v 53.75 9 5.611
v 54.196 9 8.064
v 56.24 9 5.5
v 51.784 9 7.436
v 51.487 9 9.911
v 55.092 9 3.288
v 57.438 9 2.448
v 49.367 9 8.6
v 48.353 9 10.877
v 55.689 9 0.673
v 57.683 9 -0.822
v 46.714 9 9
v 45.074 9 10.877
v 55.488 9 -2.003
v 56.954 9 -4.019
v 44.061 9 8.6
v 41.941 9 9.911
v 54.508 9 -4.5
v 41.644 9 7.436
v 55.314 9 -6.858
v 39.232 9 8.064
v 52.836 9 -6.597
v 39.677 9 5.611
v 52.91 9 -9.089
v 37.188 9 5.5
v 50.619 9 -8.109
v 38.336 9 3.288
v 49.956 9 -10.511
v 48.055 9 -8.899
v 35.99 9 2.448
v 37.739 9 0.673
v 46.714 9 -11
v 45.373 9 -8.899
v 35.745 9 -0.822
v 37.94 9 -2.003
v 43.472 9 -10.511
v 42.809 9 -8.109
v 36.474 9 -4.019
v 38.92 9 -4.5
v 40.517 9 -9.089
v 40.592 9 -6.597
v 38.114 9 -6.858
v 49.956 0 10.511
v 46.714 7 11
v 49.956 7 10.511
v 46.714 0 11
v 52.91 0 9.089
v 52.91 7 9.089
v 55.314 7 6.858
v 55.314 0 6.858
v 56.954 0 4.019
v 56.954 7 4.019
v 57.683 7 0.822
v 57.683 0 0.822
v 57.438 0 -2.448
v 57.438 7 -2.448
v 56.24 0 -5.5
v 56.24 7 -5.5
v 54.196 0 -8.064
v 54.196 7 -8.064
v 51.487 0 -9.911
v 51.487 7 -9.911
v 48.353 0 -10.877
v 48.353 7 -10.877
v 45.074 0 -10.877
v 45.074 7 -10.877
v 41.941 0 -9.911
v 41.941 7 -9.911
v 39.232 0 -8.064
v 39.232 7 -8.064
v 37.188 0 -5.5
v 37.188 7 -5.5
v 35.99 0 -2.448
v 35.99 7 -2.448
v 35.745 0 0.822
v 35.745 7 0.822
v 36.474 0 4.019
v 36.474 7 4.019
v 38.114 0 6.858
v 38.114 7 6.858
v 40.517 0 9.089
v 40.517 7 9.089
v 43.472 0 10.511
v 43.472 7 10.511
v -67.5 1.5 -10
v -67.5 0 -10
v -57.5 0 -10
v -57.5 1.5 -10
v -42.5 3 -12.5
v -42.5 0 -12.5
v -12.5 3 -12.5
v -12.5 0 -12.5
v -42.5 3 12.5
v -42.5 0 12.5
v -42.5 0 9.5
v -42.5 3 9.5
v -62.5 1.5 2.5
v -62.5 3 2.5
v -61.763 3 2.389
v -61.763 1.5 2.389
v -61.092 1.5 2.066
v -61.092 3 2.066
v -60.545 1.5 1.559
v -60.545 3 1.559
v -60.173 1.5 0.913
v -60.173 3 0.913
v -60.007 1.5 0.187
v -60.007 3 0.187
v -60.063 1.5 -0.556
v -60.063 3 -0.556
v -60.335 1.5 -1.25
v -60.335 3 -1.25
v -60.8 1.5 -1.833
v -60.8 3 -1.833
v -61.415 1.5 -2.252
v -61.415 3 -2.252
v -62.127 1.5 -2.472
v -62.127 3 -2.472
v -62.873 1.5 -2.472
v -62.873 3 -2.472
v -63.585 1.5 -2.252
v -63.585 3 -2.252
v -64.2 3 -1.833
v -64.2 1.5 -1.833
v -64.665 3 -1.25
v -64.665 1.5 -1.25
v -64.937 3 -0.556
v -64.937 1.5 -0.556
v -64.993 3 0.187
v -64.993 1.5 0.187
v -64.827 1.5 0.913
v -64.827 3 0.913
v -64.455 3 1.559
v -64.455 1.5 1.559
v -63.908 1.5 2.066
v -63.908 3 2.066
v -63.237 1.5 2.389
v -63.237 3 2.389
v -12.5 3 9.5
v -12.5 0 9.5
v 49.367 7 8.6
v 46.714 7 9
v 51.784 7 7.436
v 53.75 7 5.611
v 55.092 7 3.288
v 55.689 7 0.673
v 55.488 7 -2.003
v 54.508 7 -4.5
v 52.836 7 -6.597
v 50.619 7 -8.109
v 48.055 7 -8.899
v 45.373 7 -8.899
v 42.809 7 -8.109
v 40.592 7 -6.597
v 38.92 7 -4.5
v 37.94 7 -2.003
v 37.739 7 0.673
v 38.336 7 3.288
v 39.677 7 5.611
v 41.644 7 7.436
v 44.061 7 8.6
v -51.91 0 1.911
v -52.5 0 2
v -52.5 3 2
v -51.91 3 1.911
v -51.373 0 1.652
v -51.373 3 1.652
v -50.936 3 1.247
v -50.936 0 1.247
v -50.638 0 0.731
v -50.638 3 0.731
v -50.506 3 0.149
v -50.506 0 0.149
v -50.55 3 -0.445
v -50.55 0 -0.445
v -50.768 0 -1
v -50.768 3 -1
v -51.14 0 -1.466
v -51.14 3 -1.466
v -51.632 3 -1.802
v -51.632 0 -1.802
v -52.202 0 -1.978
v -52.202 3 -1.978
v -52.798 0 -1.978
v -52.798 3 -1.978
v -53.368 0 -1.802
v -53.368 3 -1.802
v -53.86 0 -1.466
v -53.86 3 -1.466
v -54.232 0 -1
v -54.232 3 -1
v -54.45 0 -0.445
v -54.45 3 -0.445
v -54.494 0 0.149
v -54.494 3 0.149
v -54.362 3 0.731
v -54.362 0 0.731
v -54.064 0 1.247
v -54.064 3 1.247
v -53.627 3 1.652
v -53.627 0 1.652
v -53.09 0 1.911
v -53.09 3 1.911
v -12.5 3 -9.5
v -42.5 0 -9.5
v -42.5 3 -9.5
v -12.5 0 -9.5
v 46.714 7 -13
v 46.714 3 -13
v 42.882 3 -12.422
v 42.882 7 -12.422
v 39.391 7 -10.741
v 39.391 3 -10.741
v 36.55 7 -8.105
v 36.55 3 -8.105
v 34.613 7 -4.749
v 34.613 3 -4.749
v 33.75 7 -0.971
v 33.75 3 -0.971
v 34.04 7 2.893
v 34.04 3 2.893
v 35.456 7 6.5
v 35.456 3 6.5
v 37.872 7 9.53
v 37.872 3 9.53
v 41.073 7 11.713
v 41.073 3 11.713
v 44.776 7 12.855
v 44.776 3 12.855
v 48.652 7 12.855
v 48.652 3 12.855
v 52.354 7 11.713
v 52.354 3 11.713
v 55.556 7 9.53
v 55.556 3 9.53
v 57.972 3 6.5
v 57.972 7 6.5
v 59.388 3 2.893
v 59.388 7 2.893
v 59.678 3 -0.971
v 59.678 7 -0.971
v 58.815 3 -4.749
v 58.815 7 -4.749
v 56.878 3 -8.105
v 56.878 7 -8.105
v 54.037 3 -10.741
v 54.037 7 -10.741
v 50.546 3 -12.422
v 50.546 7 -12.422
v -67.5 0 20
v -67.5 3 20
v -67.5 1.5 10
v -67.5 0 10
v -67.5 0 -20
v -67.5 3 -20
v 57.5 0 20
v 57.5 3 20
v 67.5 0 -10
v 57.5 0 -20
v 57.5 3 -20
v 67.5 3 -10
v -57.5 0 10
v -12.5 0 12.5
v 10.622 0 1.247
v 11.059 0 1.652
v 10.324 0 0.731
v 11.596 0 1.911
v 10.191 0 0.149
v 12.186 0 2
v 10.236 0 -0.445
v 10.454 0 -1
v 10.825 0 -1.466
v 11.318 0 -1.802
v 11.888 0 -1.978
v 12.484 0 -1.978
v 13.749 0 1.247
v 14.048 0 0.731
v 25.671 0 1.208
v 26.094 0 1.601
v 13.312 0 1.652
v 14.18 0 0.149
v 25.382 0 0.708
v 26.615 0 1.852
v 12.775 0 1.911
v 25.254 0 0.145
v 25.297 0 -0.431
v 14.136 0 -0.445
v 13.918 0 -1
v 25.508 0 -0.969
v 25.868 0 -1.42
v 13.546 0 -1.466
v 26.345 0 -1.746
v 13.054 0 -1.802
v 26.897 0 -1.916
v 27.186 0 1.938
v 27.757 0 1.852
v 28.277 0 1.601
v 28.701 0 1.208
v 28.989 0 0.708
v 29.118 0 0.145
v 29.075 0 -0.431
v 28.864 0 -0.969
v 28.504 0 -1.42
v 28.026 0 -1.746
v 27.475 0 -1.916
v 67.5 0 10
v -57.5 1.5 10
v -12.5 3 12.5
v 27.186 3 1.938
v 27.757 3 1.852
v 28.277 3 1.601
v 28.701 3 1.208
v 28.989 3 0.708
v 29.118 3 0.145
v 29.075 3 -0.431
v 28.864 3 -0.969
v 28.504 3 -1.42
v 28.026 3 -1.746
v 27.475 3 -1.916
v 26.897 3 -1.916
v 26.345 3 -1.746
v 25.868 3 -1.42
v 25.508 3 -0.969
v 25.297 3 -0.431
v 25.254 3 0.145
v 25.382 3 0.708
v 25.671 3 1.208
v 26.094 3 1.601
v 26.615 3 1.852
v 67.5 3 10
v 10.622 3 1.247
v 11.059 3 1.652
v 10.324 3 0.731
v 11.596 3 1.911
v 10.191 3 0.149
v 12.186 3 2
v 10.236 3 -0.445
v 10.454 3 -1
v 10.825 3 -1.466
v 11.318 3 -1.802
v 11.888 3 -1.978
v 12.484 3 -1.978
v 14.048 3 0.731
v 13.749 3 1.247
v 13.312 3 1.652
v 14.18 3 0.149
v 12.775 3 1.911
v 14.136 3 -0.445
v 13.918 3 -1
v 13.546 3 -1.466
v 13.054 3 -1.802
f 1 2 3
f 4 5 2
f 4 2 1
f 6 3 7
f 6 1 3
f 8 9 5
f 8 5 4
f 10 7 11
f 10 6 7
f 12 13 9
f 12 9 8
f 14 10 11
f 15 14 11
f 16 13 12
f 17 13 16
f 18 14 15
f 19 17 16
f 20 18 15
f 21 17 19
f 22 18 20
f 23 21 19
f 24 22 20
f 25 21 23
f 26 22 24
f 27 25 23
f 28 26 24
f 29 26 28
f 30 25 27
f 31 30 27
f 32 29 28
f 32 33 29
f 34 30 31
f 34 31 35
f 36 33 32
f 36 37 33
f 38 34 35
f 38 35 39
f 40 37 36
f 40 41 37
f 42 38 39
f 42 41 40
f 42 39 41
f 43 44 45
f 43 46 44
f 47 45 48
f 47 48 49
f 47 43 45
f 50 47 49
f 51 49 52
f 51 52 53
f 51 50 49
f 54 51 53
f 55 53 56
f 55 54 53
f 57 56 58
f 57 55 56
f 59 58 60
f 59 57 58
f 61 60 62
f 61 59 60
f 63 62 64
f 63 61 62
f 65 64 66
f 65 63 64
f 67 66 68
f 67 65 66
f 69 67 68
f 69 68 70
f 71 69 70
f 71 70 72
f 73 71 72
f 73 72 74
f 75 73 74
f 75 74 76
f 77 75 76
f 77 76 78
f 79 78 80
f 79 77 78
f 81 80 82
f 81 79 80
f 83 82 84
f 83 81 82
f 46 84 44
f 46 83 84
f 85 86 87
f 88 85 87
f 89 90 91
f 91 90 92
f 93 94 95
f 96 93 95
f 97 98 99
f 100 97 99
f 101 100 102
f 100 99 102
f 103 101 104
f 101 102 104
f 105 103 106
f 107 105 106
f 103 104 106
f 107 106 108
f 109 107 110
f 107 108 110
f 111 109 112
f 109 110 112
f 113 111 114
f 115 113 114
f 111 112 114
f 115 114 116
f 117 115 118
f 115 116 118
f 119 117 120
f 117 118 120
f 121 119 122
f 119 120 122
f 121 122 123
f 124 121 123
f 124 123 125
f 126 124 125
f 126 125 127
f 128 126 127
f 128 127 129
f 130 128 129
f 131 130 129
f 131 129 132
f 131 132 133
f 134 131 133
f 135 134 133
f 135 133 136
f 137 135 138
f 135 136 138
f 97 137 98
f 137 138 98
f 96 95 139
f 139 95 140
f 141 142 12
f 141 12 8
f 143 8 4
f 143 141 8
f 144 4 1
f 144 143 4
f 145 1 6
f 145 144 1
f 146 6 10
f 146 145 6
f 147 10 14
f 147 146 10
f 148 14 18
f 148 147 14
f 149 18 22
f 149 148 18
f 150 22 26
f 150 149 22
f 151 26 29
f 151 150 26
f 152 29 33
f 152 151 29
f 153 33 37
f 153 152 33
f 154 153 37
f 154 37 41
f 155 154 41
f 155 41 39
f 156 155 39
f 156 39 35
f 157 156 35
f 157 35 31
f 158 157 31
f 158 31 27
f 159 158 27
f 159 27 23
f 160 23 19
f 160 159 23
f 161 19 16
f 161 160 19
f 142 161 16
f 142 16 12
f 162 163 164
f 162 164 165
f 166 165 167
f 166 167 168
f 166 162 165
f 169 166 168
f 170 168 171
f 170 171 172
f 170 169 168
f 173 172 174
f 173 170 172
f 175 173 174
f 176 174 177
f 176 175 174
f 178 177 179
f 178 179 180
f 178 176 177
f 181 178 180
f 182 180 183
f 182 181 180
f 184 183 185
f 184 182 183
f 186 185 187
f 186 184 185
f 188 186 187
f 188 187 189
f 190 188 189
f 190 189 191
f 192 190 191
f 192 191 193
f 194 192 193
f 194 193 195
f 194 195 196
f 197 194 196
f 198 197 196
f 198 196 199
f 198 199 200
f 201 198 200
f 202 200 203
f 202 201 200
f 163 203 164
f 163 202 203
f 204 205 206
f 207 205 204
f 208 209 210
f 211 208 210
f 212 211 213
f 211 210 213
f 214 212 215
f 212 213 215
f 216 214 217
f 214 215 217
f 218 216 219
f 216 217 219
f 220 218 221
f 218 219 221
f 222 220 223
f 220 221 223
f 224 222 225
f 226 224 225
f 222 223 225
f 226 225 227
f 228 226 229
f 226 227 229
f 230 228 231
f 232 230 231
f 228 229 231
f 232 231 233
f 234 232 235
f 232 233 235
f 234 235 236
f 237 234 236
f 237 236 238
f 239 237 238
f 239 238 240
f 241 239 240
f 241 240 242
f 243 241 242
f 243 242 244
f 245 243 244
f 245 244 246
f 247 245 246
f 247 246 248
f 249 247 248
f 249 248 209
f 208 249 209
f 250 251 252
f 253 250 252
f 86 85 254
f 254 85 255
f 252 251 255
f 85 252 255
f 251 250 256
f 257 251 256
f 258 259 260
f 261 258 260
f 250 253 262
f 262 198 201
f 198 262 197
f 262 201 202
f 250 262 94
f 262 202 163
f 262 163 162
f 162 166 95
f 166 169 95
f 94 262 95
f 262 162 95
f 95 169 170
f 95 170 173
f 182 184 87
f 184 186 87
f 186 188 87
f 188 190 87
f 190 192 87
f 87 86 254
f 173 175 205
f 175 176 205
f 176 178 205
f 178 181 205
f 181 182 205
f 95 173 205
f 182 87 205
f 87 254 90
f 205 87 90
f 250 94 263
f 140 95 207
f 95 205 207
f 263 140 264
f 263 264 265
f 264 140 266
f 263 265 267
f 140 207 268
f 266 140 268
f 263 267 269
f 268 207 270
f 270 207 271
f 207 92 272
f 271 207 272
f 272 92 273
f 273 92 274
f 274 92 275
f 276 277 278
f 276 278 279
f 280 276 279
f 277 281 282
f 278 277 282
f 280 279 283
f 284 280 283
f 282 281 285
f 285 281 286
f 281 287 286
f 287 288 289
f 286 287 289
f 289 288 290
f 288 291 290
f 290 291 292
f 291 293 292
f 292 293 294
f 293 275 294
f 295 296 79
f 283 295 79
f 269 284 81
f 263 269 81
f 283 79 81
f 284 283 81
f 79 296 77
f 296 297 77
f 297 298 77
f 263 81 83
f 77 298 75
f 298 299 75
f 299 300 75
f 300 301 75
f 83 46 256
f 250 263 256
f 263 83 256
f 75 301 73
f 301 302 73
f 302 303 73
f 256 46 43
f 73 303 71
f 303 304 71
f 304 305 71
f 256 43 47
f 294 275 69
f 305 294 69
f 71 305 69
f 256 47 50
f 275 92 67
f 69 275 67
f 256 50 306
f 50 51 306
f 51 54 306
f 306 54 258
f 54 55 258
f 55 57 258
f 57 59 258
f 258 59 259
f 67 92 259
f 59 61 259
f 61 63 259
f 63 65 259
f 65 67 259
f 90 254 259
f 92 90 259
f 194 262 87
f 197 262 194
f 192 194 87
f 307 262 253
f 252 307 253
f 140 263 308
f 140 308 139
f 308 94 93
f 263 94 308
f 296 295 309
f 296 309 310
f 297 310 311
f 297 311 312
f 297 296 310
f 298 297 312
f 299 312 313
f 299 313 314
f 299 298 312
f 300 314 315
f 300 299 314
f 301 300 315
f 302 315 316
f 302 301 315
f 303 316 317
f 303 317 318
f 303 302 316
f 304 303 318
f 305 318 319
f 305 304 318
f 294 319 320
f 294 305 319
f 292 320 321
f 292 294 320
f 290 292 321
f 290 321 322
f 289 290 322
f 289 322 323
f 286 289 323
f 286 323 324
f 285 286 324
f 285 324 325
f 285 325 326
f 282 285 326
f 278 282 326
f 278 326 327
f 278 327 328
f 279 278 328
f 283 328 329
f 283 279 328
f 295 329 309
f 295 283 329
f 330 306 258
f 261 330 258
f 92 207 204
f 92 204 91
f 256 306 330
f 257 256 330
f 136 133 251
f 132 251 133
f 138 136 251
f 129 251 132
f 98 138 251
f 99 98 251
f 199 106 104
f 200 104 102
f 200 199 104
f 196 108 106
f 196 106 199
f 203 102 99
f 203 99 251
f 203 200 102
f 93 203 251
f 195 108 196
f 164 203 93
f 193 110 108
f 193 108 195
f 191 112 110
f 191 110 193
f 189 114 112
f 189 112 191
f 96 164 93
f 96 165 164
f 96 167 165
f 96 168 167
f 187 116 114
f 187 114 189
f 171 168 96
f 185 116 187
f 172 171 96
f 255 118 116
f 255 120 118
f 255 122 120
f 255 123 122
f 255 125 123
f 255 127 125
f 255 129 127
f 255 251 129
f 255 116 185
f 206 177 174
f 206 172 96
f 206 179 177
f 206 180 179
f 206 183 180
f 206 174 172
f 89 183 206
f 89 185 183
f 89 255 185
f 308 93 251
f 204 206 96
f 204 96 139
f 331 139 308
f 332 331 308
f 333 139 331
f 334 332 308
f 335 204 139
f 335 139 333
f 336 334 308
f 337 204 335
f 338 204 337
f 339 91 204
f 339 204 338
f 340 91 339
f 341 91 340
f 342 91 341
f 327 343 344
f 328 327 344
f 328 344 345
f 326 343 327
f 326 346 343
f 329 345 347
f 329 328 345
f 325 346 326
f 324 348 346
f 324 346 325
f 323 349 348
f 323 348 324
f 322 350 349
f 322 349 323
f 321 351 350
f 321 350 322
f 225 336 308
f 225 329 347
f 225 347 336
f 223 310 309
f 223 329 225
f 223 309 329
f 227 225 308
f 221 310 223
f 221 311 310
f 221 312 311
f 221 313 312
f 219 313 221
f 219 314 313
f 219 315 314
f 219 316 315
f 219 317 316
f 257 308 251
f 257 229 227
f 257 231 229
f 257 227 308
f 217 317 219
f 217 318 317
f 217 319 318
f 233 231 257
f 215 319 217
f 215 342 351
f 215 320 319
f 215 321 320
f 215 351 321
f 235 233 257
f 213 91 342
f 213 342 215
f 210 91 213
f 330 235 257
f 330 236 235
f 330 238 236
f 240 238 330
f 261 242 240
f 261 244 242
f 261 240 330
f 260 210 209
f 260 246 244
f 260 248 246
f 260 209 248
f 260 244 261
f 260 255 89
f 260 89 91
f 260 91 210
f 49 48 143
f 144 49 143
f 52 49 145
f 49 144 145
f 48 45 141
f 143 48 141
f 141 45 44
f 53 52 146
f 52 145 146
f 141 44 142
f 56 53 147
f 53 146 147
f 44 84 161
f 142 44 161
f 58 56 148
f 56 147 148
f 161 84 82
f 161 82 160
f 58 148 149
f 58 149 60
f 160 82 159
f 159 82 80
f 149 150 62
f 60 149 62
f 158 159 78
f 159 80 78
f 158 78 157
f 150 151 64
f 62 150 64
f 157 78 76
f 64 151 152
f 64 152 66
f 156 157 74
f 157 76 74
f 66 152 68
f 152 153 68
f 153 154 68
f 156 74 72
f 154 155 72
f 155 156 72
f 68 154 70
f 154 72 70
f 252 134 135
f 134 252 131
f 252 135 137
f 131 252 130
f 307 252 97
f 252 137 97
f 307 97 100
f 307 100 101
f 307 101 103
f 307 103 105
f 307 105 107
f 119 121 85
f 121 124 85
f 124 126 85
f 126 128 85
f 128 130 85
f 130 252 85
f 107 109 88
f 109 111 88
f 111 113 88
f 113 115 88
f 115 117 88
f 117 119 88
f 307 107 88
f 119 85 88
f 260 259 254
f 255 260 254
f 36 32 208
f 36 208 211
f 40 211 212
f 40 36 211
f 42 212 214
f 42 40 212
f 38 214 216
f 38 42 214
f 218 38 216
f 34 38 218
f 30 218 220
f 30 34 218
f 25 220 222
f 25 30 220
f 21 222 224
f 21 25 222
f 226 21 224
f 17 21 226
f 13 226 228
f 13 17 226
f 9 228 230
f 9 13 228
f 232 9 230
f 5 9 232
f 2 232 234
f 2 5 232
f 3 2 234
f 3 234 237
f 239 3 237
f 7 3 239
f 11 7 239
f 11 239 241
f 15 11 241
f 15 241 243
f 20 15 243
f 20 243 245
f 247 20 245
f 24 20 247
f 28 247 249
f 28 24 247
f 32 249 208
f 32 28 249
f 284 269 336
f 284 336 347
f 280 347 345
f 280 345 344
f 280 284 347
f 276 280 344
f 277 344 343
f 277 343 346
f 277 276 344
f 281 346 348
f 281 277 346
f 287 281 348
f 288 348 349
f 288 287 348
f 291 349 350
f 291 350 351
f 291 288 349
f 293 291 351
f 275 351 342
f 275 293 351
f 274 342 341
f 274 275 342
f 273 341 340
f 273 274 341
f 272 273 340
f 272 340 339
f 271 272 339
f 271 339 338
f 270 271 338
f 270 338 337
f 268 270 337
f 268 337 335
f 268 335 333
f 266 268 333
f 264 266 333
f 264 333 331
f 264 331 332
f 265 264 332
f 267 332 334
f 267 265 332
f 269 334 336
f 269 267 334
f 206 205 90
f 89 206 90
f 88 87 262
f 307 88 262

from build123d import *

# Parameters (mm, degrees)
CROQUIS1_R              = 11
CROQUIS1_R_2            = 2
CROQUIS1_R_3            = 1.937672591
CROQUIS1_W              = 30
CROQUIS1_H              = 3
SALIENTE_EXTRUIR1_DEPTH = 3
CROQUIS2_R              = 13
CROQUIS2_R_2            = 11
SALIENTE_EXTRUIR2_DEPTH = 4
CROQUIS3_R              = 13
CROQUIS3_R_2            = 9
SALIENTE_EXTRUIR3_DEPTH = 2
CHAFL_N1_SIZE           = 2
CHAFL_N2_SIZE           = 10
CROQUIS4_W              = 10
CROQUIS4_H              = 20
CROQUIS4_R              = 2.5
SALIENTE_EXTRUIR4_DEPTH = 1.5


with BuildPart() as part:
    # Croquis1 → Saliente-Extruir1 (new body)
    with BuildSketch(Plane(origin=(0, 0, 0), x_dir=(1, 0, 0), z_dir=(0, 1, 0))):
        Polygon((-67.5, -20), (67.5, -20), (67.5, 20), (-67.5, 20), (-67.5, 10), (-57.5, 10), (-57.5, -10), (-67.5, -10), align=None)
        with Locations(Location((46.713951104, 0, 0), (0, 0, 270))):
            Circle(CROQUIS1_R, mode=Mode.SUBTRACT)
        with Locations(Location((-52.5, 0, 0), (0, 0, 270))):
            Circle(CROQUIS1_R_2, mode=Mode.SUBTRACT)
        with Locations(Location((27.185770037, 0, 0), (0, 0, 270))):
            Circle(CROQUIS1_R_3, mode=Mode.SUBTRACT)
        with Locations(Location((12.185770037, 0, 0), (0, 0, 270))):
            Circle(CROQUIS1_R_2, mode=Mode.SUBTRACT)
        with Locations((-27.5, 11)):
            Rectangle(CROQUIS1_W, CROQUIS1_H, mode=Mode.SUBTRACT)
        with Locations((-27.5, -11)):
            Rectangle(CROQUIS1_W, CROQUIS1_H, mode=Mode.SUBTRACT)
    extrude(amount=SALIENTE_EXTRUIR1_DEPTH)

    # Croquis2 → Saliente-Extruir2 (add)
    with BuildSketch(Plane(origin=(0, 3, 0), x_dir=(1, 0, 0), z_dir=(0, 1, 0))):
        with Locations(Location((46.713951104, 0, 0), (0, 0, 90))):
            Circle(CROQUIS2_R)
        with Locations(Location((46.713951104, 0, 0), (0, 0, 270))):
            Circle(CROQUIS2_R_2, mode=Mode.SUBTRACT)
    extrude(amount=SALIENTE_EXTRUIR2_DEPTH)

    # Croquis3 → Saliente-Extruir3 (add)
    with BuildSketch(Plane(origin=(0, 7, 0), x_dir=(1, 0, 0), z_dir=(0, 1, 0))):
        with Locations(Location((46.713951104, 0, 0), (0, 0, 90))):
            Circle(CROQUIS3_R)
        with Locations(Location((46.713951104, 0, 0), (0, 0, 270))):
            Circle(CROQUIS3_R_2, mode=Mode.SUBTRACT)
    extrude(amount=SALIENTE_EXTRUIR3_DEPTH)

    # Chaflán1
    chafl_n1_edges = [part.edges().sort_by_distance(p)[0] for p in [
        (46.713951104, 9, 13),
    ]]
    chamfer(chafl_n1_edges, length=CHAFL_N1_SIZE)

    # Chaflán2
    chafl_n2_edges = [part.edges().sort_by_distance(p)[0] for p in [
        (67.5, 1.5, 20),
        (67.5, 1.5, -20),
    ]]
    chamfer(chafl_n2_edges, length=CHAFL_N2_SIZE)

    # Croquis4 → Saliente-Extruir4 (add)
    with BuildSketch(Plane(origin=(0, 3, 0), x_dir=(1, 0, 0), z_dir=(0, 1, 0))):
        with Locations((-62.5, 0)):
            Rectangle(CROQUIS4_W, CROQUIS4_H)
        with Locations(Location((-62.5, 0, 0), (0, 0, 270))):
            Circle(CROQUIS4_R, mode=Mode.SUBTRACT)
    extrude(amount=-SALIENTE_EXTRUIR4_DEPTH)


solid = part.part
